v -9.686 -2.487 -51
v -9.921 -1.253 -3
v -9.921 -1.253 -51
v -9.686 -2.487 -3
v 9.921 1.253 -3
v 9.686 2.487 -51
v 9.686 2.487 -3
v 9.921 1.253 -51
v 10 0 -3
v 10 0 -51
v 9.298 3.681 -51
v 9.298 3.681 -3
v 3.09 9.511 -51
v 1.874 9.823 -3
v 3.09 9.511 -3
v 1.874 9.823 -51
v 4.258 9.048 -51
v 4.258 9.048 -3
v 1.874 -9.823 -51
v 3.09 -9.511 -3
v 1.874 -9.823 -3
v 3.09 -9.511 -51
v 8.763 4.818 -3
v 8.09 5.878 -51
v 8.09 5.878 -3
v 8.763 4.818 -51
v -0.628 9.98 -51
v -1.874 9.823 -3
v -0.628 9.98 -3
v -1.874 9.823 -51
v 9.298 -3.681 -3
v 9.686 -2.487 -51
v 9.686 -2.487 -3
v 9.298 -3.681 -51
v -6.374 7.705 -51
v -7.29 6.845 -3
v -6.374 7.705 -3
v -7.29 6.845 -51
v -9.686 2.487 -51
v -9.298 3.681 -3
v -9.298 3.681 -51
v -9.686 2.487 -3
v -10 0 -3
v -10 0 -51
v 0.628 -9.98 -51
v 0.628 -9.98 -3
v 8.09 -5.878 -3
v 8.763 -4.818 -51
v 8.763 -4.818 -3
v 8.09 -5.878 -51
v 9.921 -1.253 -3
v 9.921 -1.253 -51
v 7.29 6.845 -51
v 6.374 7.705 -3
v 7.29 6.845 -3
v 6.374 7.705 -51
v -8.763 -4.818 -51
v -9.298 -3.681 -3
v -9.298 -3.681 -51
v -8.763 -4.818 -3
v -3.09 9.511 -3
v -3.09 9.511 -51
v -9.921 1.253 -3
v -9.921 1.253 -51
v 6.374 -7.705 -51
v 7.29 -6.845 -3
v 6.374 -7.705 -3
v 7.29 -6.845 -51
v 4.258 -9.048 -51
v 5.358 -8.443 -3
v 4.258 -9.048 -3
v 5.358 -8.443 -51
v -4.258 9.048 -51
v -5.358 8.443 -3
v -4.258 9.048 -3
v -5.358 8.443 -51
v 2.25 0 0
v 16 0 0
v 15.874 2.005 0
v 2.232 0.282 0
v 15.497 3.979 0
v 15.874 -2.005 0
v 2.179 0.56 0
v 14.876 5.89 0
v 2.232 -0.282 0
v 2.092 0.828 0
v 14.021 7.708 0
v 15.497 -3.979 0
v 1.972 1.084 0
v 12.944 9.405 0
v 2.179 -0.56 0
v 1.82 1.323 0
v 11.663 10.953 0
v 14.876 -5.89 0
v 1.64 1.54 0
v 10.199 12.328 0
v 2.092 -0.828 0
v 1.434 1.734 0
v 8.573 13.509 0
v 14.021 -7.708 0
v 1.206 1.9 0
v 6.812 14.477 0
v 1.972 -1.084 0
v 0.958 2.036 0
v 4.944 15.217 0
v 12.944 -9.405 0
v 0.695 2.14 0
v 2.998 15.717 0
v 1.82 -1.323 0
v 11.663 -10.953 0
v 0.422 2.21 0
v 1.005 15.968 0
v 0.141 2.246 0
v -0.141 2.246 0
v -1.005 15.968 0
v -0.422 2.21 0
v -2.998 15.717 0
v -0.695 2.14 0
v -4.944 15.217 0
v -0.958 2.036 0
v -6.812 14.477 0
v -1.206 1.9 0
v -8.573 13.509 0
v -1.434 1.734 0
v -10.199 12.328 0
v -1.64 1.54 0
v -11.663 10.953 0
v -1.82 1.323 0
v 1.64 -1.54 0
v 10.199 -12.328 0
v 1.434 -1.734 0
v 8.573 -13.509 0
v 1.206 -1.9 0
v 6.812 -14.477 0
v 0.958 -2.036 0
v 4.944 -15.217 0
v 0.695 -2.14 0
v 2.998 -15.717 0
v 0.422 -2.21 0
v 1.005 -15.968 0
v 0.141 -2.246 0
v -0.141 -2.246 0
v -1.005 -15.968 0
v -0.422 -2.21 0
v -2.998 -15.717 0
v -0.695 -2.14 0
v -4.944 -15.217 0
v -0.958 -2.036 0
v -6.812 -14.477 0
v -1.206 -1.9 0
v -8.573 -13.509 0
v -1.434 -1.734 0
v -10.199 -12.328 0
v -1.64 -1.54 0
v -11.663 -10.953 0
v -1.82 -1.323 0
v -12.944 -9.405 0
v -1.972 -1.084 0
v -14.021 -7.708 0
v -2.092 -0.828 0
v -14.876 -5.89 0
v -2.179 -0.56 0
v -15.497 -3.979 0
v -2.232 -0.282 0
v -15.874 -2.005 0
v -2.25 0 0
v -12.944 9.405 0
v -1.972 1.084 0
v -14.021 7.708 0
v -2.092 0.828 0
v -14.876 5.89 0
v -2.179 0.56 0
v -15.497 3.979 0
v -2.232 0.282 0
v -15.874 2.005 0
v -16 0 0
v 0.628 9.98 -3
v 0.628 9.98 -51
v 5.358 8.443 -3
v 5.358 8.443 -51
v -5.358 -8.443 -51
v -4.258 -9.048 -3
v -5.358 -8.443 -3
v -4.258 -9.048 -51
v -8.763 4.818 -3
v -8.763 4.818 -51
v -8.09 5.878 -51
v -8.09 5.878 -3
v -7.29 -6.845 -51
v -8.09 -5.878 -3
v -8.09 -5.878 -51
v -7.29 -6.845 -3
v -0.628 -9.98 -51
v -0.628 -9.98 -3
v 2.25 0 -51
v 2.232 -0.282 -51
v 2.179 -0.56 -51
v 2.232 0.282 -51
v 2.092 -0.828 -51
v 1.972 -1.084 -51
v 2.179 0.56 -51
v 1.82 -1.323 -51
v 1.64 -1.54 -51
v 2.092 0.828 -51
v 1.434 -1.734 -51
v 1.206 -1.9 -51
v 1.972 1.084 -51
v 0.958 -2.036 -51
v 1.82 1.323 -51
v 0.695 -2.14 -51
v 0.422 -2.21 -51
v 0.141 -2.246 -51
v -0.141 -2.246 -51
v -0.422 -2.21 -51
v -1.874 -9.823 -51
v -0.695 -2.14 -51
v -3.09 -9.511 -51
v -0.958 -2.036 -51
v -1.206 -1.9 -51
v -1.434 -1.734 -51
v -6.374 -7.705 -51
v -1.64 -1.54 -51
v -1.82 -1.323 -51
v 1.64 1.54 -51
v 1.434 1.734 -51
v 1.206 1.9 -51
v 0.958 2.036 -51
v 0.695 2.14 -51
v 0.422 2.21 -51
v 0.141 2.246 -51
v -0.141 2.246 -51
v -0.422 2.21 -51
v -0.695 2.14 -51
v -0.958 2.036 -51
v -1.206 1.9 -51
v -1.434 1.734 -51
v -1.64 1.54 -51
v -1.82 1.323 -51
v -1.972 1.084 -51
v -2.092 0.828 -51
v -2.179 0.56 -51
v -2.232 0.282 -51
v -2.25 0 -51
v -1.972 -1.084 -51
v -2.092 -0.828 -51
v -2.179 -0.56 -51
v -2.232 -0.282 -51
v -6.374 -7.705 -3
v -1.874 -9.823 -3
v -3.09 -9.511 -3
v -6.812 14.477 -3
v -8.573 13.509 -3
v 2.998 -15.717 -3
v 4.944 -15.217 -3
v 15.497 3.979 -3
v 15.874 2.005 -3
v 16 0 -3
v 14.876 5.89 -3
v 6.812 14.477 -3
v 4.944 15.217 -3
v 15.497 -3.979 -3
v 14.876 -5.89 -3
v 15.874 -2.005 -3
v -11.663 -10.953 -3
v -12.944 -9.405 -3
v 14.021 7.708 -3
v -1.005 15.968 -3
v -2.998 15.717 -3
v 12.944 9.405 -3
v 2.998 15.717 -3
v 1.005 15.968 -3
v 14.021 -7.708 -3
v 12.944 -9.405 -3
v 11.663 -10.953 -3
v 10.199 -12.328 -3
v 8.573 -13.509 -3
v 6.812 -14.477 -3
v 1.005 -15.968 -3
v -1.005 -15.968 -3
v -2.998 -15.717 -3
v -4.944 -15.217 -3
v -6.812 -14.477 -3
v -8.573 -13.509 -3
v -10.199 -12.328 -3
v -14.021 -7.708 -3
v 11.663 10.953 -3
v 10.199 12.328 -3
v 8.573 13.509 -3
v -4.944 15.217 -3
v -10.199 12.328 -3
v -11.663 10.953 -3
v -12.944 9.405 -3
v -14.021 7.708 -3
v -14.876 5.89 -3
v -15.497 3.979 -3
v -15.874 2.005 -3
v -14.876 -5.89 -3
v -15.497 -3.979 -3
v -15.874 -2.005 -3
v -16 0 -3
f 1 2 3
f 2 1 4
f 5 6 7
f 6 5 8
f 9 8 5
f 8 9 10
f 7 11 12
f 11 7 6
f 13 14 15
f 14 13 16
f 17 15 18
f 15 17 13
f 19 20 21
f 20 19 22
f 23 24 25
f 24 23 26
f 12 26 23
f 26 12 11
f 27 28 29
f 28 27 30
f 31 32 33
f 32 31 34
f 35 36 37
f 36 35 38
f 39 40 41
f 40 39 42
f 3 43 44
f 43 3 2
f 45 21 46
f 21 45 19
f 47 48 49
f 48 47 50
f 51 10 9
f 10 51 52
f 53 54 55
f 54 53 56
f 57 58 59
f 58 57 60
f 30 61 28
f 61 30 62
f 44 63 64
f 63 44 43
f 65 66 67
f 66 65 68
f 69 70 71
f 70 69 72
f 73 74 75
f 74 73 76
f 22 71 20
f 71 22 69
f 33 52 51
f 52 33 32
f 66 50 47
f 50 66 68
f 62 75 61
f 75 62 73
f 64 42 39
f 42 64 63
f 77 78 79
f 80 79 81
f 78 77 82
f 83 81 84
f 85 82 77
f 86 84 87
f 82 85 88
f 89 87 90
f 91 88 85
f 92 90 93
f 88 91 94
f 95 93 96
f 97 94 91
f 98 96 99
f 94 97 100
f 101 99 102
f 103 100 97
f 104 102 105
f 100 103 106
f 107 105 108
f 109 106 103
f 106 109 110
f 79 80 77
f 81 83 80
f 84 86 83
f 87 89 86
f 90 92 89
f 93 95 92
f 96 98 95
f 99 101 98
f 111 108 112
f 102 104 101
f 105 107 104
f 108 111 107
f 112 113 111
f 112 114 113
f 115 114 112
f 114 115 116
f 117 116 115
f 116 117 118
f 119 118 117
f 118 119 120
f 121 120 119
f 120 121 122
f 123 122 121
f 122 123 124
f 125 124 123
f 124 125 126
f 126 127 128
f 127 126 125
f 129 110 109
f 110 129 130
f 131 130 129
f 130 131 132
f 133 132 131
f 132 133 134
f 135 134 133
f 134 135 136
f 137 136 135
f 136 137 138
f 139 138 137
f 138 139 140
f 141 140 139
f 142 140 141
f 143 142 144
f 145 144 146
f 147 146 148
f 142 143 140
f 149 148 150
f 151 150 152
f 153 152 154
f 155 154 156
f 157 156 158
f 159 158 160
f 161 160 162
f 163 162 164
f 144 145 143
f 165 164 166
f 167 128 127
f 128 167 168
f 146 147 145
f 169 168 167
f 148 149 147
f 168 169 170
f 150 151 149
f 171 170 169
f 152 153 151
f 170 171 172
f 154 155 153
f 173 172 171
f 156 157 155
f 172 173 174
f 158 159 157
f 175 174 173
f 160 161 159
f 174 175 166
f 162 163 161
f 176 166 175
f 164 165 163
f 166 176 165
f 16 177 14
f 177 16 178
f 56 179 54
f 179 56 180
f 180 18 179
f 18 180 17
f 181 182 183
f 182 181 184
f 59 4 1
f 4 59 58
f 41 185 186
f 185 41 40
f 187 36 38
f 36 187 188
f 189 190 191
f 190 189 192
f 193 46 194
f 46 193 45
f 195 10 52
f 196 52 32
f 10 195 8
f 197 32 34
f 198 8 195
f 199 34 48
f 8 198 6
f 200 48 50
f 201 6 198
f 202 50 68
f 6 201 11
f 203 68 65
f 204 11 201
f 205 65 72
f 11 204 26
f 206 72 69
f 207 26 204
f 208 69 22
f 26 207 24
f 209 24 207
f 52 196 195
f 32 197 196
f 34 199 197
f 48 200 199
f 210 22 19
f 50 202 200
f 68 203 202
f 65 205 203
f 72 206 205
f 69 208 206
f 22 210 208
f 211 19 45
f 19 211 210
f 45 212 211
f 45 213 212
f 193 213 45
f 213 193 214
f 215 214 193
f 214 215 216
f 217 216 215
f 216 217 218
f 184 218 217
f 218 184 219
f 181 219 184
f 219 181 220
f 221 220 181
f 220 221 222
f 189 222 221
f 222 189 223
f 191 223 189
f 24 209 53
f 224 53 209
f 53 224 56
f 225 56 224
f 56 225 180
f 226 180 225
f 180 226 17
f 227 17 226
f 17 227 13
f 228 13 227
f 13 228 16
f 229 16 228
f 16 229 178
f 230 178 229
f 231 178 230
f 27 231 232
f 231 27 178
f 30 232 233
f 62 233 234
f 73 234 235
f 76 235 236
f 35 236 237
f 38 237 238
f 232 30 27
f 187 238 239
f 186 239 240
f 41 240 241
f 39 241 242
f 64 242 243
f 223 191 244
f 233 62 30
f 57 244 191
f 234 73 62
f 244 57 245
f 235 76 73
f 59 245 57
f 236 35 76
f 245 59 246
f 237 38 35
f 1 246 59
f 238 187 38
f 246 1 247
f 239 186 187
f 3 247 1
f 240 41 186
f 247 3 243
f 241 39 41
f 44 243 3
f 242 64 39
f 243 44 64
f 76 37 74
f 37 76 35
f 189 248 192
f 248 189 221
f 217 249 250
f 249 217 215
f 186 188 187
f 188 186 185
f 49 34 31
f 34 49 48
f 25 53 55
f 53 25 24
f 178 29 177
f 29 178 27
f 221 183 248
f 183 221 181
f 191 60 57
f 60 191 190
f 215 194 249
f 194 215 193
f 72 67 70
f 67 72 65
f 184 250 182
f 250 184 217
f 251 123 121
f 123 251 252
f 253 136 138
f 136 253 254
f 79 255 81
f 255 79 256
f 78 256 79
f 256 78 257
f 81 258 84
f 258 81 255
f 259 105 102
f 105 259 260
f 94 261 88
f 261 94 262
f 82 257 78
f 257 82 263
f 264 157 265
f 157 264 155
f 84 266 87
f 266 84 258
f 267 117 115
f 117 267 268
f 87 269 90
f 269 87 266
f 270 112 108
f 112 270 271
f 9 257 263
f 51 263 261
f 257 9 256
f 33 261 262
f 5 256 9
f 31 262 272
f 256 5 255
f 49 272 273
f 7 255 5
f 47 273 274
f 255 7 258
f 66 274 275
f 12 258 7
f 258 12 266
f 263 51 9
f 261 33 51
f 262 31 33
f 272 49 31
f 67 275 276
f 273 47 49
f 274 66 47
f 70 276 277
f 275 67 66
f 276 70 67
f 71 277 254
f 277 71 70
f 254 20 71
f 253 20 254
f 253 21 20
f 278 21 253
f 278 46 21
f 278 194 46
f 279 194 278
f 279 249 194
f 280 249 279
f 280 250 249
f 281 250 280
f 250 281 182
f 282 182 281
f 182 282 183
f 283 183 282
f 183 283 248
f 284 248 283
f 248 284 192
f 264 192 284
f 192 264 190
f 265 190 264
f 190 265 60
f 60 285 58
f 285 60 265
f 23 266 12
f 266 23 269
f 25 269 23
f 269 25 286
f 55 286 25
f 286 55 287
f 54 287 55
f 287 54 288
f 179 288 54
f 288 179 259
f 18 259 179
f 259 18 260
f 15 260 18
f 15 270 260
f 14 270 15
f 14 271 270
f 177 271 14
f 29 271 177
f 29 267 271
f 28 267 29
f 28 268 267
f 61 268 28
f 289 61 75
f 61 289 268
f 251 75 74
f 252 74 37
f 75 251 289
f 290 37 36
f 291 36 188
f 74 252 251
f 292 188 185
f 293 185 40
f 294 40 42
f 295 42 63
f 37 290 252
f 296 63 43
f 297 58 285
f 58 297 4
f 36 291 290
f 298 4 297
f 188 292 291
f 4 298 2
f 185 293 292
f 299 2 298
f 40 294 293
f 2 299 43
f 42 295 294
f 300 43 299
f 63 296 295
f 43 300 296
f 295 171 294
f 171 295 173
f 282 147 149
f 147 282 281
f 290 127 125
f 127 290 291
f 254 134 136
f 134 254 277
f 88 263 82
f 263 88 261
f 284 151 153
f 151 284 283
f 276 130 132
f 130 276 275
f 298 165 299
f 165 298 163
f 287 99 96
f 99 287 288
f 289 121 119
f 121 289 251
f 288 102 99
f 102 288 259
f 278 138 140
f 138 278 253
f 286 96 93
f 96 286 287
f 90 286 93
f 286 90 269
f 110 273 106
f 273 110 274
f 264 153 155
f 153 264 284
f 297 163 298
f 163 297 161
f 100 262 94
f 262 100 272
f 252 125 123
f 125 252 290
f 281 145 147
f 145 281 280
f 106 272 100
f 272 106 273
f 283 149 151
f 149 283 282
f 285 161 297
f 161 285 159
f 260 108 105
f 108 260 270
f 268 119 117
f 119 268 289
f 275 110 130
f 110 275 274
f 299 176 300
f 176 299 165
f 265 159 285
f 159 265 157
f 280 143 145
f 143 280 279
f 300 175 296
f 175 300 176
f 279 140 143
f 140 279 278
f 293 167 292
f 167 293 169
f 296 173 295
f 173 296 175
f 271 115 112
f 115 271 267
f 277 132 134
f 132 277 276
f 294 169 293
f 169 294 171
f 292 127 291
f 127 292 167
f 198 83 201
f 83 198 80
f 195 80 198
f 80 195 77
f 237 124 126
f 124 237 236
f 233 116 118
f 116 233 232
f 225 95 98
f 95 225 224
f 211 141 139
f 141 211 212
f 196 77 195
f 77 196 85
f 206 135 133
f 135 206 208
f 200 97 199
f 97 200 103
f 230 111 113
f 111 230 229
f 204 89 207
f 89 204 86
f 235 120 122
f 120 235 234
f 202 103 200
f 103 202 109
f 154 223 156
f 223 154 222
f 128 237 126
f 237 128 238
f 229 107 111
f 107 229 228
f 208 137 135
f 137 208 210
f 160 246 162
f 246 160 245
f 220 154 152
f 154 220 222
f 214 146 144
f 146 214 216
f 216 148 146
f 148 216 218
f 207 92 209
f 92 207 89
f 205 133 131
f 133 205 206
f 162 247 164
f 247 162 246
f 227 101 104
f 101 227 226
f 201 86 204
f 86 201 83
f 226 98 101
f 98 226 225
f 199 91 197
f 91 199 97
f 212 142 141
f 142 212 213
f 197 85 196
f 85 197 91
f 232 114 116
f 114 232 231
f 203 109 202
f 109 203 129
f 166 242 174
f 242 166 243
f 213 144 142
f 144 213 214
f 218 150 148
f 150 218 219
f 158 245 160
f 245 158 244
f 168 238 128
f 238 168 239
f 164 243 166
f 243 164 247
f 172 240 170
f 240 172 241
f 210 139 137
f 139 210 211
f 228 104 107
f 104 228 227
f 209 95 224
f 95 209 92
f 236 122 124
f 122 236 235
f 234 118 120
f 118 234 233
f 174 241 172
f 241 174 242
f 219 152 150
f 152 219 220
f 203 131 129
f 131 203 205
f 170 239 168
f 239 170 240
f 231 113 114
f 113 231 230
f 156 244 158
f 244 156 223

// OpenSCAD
$fn = 50;


difference() {
	union() {
		translate(v = [0, 0, -51.0000000000]) {
			cylinder(h = 51, r = 10.0000000000);
		}
		translate(v = [0, 0, -3.0000000000]) {
			cylinder(h = 3, r = 16.0000000000);
		}
	}
	union() {
		#translate(v = [0, 0, -51]) {
			cylinder(h = 51, r = 2.2500000000);
		}
	}
}
